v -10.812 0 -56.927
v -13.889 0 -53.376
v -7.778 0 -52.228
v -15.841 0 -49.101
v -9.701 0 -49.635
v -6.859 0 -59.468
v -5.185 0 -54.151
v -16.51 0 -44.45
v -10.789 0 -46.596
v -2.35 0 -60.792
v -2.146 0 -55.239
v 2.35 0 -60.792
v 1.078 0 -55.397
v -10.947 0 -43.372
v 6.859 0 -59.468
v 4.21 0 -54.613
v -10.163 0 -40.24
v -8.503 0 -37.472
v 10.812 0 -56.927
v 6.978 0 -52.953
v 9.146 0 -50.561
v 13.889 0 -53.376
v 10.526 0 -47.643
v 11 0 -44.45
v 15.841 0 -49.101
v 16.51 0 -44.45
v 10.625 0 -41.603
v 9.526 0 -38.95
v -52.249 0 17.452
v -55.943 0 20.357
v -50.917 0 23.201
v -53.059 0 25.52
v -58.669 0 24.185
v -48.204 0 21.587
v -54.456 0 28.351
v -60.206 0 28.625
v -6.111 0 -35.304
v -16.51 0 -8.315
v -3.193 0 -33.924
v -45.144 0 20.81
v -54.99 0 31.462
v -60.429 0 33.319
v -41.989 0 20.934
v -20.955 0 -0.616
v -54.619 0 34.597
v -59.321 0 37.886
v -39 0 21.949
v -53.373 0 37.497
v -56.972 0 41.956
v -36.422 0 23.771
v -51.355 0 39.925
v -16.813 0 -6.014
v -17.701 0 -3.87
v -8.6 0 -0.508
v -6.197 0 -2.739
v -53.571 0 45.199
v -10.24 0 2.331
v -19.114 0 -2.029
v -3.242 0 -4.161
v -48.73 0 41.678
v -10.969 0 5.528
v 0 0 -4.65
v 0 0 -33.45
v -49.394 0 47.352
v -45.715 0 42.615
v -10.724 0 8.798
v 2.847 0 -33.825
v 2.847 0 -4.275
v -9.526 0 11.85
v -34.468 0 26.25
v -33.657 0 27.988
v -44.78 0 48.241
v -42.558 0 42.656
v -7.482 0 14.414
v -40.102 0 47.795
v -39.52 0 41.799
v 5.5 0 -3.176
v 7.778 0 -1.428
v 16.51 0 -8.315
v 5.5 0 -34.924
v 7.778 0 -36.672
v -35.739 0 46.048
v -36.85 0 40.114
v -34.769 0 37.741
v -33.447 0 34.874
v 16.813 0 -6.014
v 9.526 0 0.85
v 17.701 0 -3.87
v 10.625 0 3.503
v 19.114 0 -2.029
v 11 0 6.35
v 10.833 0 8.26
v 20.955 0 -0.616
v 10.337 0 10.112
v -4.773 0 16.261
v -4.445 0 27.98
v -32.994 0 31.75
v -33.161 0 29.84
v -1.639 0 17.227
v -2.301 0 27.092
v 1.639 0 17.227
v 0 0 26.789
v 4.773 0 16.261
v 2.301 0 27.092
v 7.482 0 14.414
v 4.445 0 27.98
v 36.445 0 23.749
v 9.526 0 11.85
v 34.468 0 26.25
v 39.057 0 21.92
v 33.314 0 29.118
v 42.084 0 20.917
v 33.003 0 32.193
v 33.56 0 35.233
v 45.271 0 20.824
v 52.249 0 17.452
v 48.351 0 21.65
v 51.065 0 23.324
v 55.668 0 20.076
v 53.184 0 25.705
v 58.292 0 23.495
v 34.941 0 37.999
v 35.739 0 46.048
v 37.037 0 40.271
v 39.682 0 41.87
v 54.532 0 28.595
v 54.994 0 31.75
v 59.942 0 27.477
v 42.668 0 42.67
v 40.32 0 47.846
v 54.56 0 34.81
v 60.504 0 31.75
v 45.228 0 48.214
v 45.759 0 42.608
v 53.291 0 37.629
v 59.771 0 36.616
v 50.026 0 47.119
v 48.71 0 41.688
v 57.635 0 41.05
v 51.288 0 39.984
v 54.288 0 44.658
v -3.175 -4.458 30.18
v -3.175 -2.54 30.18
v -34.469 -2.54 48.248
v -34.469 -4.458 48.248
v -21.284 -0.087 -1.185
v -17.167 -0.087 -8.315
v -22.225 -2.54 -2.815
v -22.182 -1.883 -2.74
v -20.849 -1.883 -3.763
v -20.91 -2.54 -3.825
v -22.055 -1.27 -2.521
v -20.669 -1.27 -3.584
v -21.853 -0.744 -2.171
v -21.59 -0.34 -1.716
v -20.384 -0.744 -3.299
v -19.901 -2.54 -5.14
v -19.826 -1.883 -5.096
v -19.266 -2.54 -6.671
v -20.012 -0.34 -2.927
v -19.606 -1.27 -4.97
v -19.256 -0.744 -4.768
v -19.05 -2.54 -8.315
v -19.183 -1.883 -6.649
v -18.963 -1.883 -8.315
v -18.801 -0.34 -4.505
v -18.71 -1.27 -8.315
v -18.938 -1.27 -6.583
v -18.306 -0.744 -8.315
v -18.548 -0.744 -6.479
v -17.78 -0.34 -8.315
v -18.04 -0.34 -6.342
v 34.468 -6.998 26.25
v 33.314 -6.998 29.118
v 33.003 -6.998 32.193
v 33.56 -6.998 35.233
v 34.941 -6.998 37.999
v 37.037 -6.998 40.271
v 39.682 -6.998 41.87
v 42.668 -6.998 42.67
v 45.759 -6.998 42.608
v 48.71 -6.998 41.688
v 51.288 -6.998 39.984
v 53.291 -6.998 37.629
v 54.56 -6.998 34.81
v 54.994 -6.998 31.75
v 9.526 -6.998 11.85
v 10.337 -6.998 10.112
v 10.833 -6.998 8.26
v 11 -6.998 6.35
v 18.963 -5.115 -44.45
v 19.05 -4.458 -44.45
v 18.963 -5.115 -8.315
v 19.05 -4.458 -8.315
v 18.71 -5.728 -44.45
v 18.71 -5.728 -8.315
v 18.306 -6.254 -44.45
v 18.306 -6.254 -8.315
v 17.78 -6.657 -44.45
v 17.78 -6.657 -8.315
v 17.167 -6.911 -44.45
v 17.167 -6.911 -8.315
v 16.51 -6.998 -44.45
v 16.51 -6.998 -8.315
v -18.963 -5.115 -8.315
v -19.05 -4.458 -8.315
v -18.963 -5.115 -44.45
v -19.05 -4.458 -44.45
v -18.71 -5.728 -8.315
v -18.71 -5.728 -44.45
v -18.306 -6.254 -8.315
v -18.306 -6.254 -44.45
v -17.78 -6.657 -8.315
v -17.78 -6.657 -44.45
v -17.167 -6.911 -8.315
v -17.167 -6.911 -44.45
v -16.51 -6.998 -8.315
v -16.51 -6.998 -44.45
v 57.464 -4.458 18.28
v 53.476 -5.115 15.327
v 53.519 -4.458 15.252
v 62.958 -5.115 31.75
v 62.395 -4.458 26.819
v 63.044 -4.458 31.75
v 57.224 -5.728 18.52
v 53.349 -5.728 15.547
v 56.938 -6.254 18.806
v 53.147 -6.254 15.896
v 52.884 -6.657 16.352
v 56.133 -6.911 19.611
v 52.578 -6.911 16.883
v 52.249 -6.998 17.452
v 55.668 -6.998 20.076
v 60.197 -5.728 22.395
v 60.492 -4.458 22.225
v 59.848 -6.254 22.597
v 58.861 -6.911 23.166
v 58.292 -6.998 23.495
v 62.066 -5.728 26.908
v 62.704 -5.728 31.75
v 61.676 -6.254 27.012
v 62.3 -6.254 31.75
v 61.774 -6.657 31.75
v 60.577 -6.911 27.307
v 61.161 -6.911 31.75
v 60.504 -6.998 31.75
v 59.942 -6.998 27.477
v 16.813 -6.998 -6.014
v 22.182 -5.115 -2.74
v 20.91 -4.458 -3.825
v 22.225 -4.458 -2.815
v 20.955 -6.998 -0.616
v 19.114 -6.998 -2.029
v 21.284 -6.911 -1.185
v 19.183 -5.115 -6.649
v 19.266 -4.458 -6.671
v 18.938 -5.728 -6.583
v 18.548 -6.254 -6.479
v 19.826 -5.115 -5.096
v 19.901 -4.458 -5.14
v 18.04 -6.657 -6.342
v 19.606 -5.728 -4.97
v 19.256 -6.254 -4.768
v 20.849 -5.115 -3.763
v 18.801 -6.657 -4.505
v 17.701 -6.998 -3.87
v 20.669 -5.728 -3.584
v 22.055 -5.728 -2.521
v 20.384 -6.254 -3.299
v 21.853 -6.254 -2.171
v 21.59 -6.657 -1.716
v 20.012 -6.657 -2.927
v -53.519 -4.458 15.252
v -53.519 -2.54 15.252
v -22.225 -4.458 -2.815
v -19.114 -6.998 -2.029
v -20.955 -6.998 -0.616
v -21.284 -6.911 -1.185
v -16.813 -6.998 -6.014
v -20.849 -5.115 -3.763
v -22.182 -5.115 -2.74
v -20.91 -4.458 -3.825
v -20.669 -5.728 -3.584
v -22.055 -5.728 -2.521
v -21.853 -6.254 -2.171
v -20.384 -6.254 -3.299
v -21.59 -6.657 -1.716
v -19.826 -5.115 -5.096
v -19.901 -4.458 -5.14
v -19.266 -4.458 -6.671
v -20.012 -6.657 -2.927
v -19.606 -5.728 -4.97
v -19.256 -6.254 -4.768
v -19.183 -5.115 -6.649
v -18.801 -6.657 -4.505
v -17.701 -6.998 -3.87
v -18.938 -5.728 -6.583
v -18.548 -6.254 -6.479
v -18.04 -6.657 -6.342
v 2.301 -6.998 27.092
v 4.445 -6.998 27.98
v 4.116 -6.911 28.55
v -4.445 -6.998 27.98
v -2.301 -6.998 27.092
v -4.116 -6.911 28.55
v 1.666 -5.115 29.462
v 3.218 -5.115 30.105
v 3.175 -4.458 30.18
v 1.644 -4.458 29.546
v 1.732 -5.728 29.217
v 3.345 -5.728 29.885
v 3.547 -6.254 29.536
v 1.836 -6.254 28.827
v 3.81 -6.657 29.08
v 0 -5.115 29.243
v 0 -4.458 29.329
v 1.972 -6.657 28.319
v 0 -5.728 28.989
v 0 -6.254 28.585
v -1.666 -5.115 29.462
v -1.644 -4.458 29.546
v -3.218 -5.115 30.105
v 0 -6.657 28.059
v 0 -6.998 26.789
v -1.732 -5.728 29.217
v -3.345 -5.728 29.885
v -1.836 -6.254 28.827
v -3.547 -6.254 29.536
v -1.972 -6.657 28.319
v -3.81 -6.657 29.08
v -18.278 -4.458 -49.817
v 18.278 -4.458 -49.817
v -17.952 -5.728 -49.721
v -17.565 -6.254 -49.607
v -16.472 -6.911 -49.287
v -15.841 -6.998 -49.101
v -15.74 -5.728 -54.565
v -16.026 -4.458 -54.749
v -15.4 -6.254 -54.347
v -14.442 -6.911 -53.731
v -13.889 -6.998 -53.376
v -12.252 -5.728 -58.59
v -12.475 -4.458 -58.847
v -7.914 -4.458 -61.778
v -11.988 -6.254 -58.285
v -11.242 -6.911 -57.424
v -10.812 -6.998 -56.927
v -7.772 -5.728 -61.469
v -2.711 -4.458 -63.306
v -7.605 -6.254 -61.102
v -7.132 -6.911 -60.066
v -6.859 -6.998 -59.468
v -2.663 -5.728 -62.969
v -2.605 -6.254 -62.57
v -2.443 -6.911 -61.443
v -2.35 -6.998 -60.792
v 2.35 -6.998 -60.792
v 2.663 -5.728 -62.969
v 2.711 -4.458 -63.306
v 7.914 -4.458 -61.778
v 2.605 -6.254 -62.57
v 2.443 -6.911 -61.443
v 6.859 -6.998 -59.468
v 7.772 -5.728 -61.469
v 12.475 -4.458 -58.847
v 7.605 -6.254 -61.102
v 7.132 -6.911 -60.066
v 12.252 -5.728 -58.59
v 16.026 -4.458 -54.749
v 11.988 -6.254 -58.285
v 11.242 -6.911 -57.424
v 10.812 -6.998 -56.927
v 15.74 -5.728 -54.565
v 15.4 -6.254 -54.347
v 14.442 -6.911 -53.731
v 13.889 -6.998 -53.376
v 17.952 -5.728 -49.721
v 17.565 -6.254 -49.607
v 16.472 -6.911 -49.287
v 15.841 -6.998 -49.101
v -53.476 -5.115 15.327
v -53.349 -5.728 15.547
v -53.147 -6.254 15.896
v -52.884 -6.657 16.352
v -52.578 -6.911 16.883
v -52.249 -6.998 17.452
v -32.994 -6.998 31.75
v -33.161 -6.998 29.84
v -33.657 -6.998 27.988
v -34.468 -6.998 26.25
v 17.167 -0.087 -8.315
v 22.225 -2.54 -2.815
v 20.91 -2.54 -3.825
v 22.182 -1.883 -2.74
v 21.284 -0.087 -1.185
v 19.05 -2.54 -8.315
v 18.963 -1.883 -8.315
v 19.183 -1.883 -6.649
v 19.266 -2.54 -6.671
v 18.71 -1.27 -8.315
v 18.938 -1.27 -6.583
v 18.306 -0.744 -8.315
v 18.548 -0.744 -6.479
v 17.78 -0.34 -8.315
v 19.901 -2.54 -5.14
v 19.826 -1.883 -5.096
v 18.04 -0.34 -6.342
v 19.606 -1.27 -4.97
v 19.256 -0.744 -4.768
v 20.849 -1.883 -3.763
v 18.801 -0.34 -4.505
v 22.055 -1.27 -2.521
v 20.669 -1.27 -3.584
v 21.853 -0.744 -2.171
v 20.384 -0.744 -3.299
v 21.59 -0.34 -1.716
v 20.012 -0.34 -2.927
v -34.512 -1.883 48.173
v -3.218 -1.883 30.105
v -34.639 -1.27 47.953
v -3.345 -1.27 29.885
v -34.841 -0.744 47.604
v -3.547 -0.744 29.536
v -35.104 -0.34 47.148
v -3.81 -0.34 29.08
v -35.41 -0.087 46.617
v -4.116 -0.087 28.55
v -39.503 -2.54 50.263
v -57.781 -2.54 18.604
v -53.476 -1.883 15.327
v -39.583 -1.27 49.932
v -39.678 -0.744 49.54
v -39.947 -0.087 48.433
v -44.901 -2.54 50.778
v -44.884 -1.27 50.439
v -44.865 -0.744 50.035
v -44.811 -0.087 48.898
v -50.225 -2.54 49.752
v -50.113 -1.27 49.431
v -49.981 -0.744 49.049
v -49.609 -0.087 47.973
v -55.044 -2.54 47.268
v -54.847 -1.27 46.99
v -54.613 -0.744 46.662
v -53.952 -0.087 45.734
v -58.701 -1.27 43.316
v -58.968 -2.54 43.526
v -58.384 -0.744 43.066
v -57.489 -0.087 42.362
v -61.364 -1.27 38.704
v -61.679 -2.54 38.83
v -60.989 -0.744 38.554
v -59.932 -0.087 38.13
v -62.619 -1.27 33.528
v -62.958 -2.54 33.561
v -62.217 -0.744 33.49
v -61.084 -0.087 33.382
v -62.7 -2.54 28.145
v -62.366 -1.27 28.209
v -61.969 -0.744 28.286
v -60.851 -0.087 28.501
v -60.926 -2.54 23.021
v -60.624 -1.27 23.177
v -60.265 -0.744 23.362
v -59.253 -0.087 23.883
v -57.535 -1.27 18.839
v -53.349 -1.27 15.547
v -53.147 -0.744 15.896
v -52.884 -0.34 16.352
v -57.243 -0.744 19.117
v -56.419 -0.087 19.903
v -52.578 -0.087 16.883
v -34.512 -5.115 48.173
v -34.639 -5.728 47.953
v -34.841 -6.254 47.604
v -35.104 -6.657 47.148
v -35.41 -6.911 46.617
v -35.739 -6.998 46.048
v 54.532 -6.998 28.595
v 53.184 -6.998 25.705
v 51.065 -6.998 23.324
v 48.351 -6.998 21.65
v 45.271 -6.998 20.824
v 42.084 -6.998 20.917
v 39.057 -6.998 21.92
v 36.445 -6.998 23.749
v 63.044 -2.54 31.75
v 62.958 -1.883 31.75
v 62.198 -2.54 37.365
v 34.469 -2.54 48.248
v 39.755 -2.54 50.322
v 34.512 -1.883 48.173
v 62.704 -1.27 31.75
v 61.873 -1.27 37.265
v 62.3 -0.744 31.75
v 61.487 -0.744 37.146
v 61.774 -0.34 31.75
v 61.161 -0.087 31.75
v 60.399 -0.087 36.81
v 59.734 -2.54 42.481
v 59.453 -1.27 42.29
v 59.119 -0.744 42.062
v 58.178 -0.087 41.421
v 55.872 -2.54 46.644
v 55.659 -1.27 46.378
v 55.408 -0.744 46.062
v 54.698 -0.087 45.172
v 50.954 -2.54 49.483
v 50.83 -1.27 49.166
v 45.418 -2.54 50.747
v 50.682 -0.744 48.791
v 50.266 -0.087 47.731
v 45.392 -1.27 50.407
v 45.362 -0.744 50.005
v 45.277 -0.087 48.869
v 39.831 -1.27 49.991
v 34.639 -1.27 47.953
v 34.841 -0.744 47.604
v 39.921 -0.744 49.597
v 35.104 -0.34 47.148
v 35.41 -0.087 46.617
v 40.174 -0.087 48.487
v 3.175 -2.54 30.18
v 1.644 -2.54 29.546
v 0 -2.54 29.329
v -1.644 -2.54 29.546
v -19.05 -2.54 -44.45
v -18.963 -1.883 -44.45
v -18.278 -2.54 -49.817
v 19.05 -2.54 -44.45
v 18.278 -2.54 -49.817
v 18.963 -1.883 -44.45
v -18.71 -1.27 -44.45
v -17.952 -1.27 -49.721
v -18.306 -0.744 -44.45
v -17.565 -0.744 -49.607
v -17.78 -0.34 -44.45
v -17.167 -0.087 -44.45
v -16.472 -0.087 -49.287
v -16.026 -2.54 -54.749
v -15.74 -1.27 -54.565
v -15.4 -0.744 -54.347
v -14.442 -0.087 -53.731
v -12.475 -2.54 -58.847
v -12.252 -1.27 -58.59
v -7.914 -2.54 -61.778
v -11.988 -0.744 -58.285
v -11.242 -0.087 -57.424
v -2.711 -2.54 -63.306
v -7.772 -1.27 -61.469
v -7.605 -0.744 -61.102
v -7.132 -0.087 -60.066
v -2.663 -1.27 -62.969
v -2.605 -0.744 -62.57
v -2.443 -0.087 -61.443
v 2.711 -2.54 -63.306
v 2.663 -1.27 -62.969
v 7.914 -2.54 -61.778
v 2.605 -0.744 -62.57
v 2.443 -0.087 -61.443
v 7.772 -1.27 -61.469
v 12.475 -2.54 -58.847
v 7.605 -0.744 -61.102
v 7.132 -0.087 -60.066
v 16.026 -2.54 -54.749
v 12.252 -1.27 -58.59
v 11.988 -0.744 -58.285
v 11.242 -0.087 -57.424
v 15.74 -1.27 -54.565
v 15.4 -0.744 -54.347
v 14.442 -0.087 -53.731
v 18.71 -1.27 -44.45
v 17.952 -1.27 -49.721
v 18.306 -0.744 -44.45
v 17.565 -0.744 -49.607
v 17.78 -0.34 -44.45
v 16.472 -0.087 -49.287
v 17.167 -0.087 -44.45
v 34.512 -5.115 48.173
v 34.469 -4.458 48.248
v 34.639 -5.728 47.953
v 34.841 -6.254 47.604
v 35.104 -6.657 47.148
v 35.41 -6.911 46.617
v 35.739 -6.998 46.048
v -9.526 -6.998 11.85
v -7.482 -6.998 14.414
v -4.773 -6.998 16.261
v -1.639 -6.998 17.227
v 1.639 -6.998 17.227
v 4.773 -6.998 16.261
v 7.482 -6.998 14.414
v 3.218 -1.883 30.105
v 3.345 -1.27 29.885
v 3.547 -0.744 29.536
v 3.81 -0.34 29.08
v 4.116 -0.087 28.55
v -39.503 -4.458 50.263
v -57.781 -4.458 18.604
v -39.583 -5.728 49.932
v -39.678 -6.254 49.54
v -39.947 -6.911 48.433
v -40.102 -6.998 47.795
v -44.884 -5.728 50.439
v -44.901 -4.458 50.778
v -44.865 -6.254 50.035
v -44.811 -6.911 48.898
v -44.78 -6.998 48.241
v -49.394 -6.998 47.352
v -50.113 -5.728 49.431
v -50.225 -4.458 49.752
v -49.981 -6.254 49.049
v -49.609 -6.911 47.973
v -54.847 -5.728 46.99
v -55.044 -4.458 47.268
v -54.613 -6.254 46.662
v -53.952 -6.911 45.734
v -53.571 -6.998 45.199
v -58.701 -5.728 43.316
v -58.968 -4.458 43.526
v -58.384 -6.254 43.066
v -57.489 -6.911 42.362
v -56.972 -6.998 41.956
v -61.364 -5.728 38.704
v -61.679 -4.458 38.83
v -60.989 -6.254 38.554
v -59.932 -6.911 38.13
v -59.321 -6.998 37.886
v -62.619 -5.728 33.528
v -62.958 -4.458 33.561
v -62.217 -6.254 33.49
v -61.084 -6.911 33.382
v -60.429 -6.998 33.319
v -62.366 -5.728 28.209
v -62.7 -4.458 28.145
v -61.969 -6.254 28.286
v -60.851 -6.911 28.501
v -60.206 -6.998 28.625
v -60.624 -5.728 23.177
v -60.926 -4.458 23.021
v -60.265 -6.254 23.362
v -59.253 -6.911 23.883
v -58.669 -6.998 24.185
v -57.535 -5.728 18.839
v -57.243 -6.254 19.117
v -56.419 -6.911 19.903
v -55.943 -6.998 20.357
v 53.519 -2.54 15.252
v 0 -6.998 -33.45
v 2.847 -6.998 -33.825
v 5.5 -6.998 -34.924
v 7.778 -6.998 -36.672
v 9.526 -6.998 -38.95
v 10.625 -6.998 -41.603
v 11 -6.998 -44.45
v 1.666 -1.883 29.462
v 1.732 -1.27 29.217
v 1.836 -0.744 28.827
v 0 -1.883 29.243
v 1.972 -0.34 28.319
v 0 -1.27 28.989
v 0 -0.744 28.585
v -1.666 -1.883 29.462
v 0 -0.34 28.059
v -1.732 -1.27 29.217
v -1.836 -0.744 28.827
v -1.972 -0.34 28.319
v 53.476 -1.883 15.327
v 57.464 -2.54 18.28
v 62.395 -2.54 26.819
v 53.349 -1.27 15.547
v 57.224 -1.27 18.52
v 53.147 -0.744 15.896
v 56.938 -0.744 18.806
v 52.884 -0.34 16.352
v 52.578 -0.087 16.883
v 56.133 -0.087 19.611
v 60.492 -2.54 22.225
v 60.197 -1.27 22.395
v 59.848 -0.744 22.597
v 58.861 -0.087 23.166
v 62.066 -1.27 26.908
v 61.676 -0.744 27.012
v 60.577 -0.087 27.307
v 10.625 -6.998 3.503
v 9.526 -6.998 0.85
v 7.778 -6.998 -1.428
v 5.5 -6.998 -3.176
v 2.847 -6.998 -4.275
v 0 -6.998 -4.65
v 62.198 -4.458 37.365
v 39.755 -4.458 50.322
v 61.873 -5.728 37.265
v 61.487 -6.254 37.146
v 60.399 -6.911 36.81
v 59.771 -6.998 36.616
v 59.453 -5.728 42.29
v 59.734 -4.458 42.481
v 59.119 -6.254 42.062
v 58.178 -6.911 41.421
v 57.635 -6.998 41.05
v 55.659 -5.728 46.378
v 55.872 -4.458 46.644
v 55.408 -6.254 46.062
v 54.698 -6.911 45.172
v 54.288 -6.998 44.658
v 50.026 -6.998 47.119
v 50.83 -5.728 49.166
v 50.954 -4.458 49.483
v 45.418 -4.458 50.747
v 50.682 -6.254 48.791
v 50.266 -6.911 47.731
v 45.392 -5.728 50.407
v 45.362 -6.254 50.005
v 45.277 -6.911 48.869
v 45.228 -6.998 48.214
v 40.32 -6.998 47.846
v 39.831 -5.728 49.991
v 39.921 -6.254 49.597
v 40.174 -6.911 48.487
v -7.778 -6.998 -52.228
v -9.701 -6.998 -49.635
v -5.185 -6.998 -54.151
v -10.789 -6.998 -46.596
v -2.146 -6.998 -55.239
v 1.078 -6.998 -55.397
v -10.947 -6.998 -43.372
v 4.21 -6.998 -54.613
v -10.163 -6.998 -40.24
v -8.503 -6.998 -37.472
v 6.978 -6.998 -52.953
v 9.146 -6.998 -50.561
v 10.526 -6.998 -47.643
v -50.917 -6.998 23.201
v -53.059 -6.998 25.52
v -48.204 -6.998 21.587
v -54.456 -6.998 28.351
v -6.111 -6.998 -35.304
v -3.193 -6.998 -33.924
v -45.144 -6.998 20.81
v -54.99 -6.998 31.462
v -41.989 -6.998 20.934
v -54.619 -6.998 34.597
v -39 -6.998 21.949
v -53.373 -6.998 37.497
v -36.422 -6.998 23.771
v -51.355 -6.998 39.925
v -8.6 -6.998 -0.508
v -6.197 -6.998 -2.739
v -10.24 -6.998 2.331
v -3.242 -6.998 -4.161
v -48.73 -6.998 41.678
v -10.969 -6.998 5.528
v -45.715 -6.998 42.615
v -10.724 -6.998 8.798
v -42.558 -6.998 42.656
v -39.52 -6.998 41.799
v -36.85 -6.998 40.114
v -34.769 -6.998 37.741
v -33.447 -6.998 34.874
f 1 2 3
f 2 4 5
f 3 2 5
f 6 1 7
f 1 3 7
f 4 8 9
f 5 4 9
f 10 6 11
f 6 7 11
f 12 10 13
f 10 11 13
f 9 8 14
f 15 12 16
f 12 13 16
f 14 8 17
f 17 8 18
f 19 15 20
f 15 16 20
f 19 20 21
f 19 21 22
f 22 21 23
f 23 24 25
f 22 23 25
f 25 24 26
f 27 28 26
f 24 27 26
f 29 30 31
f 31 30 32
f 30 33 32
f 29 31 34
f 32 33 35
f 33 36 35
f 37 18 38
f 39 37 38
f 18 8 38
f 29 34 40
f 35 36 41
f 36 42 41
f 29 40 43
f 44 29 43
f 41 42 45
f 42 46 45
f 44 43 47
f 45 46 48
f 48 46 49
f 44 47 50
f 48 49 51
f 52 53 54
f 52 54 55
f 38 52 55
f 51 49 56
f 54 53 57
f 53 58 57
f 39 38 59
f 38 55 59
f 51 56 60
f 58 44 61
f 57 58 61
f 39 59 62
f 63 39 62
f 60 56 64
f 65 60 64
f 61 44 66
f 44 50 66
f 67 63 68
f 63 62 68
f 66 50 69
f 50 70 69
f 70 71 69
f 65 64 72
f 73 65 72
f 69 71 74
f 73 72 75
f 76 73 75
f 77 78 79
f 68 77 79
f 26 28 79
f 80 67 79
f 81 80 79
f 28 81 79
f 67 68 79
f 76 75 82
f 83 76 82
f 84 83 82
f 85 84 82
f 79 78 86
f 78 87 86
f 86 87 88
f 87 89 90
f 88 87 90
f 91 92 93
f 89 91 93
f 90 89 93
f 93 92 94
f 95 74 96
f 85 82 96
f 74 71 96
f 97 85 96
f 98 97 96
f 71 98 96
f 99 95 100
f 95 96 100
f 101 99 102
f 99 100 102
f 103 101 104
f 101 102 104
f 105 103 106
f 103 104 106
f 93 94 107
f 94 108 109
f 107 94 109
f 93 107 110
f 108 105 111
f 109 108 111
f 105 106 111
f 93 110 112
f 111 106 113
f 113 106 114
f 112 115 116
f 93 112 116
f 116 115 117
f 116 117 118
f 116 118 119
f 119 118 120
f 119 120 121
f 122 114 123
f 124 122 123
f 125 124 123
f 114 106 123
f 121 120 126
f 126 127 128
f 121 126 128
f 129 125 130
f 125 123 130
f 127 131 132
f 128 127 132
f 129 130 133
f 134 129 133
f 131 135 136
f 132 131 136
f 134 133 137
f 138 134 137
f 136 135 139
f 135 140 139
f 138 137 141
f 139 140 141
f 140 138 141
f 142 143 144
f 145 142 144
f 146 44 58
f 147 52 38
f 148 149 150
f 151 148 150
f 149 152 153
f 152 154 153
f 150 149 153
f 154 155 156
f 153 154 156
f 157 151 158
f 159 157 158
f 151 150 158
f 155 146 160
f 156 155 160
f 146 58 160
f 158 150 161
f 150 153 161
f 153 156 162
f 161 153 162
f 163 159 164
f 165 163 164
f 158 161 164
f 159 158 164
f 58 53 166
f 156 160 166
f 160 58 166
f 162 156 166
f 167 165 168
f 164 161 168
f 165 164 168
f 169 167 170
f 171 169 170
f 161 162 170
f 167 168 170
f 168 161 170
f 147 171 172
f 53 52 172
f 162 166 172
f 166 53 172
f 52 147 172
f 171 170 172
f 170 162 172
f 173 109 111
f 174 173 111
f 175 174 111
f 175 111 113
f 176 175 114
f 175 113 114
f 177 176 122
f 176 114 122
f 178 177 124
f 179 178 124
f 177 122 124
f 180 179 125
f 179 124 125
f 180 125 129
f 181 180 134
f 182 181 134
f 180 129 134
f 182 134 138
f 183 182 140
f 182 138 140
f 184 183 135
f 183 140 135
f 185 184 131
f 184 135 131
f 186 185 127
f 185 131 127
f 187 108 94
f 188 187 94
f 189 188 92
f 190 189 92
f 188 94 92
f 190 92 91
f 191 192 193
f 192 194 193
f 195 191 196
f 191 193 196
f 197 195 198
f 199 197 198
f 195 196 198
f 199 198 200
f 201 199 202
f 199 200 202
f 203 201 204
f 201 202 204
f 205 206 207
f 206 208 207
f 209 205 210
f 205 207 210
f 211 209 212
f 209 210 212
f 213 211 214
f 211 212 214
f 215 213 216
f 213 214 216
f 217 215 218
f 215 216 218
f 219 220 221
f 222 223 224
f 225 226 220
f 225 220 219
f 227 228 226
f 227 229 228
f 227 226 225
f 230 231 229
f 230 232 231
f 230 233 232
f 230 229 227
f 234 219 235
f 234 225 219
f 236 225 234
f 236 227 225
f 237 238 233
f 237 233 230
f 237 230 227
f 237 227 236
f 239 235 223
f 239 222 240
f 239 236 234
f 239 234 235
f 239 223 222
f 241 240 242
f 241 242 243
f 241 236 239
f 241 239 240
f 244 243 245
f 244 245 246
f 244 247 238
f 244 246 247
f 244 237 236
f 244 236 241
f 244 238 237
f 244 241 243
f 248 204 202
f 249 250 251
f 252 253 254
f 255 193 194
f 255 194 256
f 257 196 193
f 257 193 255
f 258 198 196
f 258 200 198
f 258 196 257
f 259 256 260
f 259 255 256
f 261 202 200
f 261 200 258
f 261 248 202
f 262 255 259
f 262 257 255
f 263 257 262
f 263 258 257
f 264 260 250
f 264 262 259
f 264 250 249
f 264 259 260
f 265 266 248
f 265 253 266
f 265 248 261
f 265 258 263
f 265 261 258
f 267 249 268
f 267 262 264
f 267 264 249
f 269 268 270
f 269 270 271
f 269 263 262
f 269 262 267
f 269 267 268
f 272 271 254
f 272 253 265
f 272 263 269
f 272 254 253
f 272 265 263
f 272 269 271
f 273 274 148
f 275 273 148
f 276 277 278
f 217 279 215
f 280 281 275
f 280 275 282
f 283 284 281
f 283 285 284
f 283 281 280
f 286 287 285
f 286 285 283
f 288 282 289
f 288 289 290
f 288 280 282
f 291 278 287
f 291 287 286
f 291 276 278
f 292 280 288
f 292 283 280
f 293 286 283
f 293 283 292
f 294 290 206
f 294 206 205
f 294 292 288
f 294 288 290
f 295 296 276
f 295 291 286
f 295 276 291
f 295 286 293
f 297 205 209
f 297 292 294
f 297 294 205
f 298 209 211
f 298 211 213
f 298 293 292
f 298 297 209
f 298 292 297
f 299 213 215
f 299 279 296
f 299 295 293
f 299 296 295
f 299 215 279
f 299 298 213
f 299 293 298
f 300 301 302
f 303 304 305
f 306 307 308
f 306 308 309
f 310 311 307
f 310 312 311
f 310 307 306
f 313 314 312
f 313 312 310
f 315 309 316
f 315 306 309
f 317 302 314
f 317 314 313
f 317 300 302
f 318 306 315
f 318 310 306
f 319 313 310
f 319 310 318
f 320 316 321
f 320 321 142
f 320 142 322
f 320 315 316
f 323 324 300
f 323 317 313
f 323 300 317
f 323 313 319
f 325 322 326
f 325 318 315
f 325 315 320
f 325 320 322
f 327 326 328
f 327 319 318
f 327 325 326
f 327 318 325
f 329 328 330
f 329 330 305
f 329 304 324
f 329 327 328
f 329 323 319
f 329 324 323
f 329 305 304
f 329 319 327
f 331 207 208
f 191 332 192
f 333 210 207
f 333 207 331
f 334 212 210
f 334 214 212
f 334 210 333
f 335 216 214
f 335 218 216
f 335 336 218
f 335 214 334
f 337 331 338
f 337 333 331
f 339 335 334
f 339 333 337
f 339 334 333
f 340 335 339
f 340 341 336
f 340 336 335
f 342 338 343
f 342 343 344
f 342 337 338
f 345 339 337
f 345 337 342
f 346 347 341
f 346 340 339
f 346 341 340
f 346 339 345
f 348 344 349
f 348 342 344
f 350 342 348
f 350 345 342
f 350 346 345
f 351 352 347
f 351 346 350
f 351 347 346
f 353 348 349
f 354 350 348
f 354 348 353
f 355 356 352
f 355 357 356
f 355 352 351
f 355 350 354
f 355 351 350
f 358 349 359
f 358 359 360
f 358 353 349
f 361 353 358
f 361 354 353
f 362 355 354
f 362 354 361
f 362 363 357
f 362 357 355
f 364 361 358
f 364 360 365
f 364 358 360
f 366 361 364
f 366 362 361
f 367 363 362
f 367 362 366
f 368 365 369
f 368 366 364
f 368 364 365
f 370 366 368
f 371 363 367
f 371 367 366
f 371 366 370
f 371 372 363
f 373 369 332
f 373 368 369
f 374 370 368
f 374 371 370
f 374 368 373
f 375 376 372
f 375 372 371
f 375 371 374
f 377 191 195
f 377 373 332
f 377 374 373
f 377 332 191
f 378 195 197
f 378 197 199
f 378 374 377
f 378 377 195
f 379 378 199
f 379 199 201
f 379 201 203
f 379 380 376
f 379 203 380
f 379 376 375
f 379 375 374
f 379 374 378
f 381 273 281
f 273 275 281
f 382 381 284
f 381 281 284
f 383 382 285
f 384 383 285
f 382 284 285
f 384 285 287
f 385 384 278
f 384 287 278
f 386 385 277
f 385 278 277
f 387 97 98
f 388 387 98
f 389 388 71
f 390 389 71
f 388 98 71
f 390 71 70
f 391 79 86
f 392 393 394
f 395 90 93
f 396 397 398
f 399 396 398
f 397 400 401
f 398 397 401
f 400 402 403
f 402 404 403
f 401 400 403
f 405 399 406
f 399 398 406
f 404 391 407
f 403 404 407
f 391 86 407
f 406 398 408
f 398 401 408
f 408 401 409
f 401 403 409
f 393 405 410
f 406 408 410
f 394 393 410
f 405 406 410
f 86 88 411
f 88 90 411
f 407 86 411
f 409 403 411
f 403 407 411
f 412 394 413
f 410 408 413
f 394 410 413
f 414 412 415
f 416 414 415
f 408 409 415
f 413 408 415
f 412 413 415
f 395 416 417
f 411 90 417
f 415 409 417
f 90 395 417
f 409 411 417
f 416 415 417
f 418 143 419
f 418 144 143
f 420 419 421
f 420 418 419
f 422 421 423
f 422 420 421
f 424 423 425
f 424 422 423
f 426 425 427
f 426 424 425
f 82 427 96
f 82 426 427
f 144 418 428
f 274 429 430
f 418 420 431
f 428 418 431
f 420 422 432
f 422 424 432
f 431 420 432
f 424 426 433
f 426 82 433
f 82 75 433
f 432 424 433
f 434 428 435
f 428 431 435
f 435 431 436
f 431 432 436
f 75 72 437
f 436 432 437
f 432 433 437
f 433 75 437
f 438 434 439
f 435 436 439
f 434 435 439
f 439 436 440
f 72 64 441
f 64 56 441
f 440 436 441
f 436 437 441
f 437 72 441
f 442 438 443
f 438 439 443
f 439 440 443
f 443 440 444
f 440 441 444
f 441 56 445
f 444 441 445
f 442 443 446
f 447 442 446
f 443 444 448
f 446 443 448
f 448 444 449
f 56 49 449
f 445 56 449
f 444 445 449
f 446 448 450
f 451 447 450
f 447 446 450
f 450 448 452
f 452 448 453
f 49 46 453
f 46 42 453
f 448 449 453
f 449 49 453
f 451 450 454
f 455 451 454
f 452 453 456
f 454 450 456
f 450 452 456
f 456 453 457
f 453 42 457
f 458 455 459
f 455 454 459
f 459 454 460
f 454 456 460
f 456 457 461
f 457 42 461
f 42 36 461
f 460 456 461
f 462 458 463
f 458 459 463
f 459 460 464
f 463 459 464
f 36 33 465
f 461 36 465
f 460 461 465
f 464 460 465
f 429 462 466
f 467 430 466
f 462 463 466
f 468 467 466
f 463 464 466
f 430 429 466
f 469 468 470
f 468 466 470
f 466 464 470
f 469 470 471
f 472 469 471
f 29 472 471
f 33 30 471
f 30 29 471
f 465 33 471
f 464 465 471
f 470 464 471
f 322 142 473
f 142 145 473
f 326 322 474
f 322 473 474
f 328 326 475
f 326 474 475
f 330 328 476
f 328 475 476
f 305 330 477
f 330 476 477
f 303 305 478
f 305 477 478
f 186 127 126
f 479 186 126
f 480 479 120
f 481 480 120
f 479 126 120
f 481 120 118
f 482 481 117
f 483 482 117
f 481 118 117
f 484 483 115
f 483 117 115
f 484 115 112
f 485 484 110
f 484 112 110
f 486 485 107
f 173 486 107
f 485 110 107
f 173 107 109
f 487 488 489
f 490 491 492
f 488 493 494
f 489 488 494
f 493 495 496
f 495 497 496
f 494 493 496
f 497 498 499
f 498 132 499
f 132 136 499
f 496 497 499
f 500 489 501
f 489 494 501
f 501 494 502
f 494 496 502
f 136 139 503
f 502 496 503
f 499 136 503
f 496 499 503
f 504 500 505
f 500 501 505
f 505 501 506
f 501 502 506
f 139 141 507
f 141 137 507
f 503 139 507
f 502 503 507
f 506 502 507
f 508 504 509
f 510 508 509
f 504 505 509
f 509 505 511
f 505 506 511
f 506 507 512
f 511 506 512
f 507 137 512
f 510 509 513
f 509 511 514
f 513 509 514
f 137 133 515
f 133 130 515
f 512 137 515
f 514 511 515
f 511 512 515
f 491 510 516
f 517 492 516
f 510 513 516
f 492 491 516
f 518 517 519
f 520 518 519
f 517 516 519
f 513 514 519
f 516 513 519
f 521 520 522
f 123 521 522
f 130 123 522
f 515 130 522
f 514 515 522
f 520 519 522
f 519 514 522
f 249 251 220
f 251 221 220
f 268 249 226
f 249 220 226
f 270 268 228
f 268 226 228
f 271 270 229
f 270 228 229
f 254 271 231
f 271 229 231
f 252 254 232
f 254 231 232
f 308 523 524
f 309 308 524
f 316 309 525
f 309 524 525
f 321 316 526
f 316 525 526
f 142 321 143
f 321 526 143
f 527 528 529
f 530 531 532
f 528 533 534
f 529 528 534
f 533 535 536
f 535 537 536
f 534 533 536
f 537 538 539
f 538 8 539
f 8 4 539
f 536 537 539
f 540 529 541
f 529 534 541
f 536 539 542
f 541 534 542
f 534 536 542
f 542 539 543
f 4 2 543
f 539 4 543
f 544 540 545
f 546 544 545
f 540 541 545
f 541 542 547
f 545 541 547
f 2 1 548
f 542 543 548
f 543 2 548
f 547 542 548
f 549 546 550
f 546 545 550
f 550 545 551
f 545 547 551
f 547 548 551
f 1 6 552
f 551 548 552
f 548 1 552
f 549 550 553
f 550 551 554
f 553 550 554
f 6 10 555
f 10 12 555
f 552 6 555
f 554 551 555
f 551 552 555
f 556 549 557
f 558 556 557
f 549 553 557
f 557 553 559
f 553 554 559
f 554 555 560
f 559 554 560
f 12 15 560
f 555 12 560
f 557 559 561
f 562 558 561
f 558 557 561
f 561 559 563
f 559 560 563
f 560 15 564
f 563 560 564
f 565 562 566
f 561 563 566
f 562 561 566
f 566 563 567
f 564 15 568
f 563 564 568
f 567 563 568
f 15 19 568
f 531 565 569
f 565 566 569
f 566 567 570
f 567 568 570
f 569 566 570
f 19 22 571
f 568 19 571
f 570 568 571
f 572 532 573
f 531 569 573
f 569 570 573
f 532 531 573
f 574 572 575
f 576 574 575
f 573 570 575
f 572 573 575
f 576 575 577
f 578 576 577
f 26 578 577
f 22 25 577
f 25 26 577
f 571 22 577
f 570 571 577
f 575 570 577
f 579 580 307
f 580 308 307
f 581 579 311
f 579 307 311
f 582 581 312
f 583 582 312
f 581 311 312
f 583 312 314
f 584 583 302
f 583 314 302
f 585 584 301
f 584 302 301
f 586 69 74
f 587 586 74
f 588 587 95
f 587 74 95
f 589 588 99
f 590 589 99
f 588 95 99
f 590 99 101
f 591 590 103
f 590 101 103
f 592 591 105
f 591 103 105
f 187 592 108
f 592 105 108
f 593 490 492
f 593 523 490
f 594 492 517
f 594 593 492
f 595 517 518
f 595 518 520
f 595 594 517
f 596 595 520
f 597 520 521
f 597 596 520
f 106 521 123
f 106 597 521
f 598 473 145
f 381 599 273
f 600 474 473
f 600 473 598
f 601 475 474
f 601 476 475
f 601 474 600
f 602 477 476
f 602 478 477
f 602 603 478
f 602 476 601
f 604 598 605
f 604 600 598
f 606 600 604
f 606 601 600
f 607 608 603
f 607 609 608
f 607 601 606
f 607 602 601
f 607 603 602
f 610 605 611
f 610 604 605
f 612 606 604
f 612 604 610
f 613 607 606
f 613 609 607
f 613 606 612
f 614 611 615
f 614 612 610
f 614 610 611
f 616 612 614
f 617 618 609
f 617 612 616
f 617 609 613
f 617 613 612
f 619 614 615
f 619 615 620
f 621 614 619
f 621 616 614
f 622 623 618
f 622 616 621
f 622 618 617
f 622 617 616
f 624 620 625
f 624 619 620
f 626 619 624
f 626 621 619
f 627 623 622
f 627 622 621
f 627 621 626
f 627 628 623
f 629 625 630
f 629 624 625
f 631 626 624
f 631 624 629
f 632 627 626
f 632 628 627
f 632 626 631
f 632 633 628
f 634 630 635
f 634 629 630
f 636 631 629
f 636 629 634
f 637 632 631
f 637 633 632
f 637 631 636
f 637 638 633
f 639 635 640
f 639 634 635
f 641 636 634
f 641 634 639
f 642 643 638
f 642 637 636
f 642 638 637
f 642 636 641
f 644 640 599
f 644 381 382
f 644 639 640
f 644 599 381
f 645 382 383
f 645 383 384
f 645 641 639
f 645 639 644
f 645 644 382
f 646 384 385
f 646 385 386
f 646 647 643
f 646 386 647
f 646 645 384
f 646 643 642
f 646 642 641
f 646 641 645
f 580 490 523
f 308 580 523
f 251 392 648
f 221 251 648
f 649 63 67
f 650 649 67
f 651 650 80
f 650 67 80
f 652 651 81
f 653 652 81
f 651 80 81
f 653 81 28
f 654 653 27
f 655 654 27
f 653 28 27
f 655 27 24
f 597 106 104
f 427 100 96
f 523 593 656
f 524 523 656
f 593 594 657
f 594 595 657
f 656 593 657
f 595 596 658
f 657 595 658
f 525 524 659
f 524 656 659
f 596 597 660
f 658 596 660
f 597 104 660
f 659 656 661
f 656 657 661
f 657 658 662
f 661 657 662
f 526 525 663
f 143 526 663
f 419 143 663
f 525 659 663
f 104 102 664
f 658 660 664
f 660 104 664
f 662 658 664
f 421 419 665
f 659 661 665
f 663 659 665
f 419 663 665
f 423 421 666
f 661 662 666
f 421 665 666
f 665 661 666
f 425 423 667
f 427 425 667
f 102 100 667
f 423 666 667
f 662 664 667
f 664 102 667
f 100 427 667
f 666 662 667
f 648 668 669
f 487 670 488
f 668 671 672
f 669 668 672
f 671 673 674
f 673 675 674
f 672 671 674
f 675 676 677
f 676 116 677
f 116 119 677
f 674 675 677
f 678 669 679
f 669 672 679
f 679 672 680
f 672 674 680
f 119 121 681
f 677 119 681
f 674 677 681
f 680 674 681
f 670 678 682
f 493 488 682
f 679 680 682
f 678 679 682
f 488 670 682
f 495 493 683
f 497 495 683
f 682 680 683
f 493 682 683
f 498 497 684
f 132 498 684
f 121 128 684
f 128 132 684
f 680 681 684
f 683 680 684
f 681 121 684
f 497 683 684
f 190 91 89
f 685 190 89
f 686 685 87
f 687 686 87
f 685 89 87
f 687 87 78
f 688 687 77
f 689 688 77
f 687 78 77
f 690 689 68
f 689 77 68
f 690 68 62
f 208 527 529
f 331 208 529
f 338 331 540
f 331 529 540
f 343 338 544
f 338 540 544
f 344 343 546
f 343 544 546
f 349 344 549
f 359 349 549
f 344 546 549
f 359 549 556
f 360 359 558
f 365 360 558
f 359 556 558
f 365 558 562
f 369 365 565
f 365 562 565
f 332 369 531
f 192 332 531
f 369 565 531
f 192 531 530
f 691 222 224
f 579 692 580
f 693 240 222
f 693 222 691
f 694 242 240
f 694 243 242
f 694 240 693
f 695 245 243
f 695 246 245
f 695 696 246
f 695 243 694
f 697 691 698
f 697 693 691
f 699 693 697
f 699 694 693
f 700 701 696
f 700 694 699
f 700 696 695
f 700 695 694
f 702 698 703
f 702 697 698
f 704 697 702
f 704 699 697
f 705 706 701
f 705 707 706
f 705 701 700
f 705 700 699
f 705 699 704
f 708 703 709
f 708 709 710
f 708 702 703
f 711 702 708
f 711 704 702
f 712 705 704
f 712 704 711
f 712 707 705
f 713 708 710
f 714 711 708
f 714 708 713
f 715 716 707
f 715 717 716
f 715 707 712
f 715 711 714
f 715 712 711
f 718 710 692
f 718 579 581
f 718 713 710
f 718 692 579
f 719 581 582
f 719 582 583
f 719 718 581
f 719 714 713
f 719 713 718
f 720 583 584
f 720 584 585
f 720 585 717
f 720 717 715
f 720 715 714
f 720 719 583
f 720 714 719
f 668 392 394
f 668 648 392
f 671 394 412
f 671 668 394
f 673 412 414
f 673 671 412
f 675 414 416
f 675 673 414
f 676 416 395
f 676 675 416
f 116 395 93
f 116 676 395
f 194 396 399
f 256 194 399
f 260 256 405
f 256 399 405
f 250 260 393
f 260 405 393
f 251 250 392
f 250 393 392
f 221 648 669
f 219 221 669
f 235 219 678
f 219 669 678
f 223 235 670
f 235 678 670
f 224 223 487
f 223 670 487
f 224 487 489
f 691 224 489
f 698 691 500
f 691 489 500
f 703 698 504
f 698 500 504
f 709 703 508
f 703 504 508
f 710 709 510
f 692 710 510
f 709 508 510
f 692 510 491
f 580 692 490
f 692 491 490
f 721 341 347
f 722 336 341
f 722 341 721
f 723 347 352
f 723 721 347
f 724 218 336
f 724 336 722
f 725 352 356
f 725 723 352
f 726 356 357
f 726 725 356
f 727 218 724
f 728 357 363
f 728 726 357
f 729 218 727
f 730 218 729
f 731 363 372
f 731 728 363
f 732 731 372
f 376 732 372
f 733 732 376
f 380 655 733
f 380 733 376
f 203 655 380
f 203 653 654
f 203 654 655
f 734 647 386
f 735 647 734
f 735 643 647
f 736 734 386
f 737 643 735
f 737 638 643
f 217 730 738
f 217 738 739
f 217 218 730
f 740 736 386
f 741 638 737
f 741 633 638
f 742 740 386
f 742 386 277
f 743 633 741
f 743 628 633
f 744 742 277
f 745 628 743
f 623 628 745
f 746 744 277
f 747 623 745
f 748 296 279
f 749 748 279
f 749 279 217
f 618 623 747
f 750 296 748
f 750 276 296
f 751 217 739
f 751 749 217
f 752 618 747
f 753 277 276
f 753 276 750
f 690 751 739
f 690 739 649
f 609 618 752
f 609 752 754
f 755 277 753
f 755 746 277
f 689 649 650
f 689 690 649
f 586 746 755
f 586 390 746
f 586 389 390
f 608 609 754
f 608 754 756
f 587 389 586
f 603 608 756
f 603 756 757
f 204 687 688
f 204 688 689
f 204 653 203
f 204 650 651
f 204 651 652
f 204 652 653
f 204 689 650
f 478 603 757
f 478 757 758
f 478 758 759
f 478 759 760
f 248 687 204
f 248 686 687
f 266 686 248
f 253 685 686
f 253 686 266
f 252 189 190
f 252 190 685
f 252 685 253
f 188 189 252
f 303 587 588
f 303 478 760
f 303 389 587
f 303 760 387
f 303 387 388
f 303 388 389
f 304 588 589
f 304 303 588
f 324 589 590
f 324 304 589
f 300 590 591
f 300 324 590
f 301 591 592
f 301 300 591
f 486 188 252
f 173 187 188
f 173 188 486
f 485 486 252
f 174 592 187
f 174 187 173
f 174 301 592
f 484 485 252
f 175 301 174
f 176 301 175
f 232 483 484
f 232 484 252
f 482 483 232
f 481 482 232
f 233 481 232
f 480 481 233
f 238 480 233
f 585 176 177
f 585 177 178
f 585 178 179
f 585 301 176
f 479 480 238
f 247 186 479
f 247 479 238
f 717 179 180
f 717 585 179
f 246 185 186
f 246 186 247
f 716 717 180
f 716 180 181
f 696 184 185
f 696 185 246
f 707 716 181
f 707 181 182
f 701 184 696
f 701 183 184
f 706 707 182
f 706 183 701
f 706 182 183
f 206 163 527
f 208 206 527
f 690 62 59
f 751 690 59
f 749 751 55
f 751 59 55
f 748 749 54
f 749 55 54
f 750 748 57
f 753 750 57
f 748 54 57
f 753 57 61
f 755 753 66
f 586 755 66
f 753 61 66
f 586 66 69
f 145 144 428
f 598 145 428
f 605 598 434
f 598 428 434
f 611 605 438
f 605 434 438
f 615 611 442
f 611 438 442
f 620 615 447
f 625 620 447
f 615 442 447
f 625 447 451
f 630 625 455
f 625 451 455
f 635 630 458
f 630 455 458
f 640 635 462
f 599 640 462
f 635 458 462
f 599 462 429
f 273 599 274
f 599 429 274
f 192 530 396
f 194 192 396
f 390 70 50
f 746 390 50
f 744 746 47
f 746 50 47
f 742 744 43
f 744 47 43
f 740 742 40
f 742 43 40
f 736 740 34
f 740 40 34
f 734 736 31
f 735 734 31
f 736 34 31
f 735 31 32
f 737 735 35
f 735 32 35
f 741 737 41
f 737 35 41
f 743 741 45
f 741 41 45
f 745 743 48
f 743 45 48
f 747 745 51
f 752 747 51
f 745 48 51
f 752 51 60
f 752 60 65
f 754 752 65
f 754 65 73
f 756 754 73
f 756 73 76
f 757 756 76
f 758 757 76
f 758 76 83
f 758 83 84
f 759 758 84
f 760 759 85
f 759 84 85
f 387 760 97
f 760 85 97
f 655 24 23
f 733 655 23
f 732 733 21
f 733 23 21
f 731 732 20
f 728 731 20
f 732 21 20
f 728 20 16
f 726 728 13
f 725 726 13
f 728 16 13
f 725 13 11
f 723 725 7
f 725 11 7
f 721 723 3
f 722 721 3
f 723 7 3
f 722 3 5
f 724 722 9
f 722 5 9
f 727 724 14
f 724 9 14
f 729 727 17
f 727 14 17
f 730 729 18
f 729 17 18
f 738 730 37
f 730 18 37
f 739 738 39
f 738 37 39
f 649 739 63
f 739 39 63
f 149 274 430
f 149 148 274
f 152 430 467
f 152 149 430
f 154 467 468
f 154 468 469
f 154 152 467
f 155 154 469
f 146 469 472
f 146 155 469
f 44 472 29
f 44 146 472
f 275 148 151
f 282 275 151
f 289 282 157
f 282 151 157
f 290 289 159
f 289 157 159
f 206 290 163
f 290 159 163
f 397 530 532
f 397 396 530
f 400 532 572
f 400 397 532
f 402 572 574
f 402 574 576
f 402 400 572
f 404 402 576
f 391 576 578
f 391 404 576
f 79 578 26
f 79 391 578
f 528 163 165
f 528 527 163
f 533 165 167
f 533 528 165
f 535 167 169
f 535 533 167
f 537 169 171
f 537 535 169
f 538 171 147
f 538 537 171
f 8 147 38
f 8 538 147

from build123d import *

# Parameters (mm, degrees)
F1_DEPTH = 6.9977
F2_R     = 2.54


with BuildPart() as f1:
    # F0 (on Front) → F1 (new body)
    with BuildSketch(Plane.XZ):
        with BuildLine():
            ThreePointArc((16.4977839421, 15.875), (18.4008869908, 11.2805028092), (19.05, 6.35))
            ThreePointArc((19.05, 6.35), (13.4703841816, -7.1203841816), (0, -12.7))
            Line((0, -12.7), (0, -25.4))
            ThreePointArc((0, -25.4), (13.4703841816, -30.9796158184), (19.05, -44.45))
            Line((19.05, -44.45), (19.05, -8.3146968374))
            ThreePointArc((19.05, -8.3146968374), (19.900738686, -5.1396968374), (22.225, -2.8154355234))
            Line((22.225, -2.8154355234), (53.5190905122, 15.2522160579))
            ThreePointArc((53.5190905122, 15.2522160579), (39.063587703, 13.3491130092), (27.4963065702, 22.225))
            Line((27.4963065702, 22.225), (16.4977839421, 15.875))
        make_face()
        with BuildLine():
            ThreePointArc((-16.4977839421, 15.875), (0, 25.4), (16.4977839421, 15.875))
            Line((16.4977839421, 15.875), (27.4963065702, 22.225))
            ThreePointArc((27.4963065702, 22.225), (25.5932035214, 36.6805028092), (34.4690905122, 48.2477839421))
            Line((34.4690905122, 48.2477839421), (3.175, 30.1801323608))
            ThreePointArc((3.175, 30.1801323608), (0, 29.3293936748), (-3.175, 30.1801323608))
            Line((-3.175, 30.1801323608), (-34.4690905122, 48.2477839421))
            ThreePointArc((-34.4690905122, 48.2477839421), (-27.4963065702, 41.275), (-24.9440905122, 31.75))
            ThreePointArc((-24.9440905122, 31.75), (-25.5932035214, 26.8194971908), (-27.4963065702, 22.225))
            Line((-27.4963065702, 22.225), (-16.4977839421, 15.875))
        make_face()
        with BuildLine():
            Line((0, -25.4), (0, -12.7))
            ThreePointArc((0, -12.7), (-16.4977839421, -3.175), (-16.4977839421, 15.875))
            Line((-16.4977839421, 15.875), (-27.4963065702, 22.225))
            ThreePointArc((-27.4963065702, 22.225), (-39.063587703, 13.3491130092), (-53.5190905122, 15.2522160579))
            Line((-53.5190905122, 15.2522160579), (-22.225, -2.8154355234))
            ThreePointArc((-22.225, -2.8154355234), (-19.900738686, -5.1396968374), (-19.05, -8.3146968374))
            Line((-19.05, -8.3146968374), (-19.05, -44.45))
            ThreePointArc((-19.05, -44.45), (-13.4703841816, -30.9796158184), (0, -25.4))
        make_face()
        with BuildLine():
            ThreePointArc((34.4690905122, 48.2477839421), (25.5932035214, 36.6805028092), (27.4963065702, 22.225))
            ThreePointArc((27.4963065702, 22.225), (39.063587703, 13.3491130092), (53.5190905122, 15.2522160579))
            ThreePointArc((53.5190905122, 15.2522160579), (60.4918744543, 22.225), (63.0440905122, 31.75))
            ThreePointArc((63.0440905122, 31.75), (53.5190905122, 48.2477839421), (34.4690905122, 48.2477839421))
        make_face()
        with BuildLine():
            ThreePointArc((54.9940939122, 31.75), (46.8411008884, 21.1248126267), (34.4678081261, 26.2499983))
            ThreePointArc((34.4678081261, 26.2499983), (41.1470801361, 42.3751873733), (54.9940939122, 31.75))
        make_face(mode=Mode.SUBTRACT)
        with BuildLine():
            ThreePointArc((19.05, -44.45), (13.4703841816, -30.9796158184), (0, -25.4))
            ThreePointArc((0, -25.4), (-13.4703841816, -30.9796158184), (-19.05, -44.45))
            ThreePointArc((-19.05, -44.45), (0, -63.5), (19.05, -44.45))
        make_face()
        with BuildLine():
            ThreePointArc((11.0000034, -44.45), (-7.7781769972, -52.2281769972), (0, -33.4499966))
            ThreePointArc((0, -33.4499966), (7.7781769972, -36.6718230028), (11.0000034, -44.45))
        make_face(mode=Mode.SUBTRACT)
        with BuildLine():
            ThreePointArc((-53.5190905122, 15.2522160579), (-39.063587703, 13.3491130092), (-27.4963065702, 22.225))
            ThreePointArc((-27.4963065702, 22.225), (-25.5932035214, 26.8194971908), (-24.9440905122, 31.75))
            ThreePointArc((-24.9440905122, 31.75), (-27.4963065702, 41.275), (-34.4690905122, 48.2477839421))
            ThreePointArc((-34.4690905122, 48.2477839421), (-60.4918744543, 41.275), (-53.5190905122, 15.2522160579))
        make_face()
        with BuildLine():
            ThreePointArc((-32.9940871122, 31.75), (-33.3689031389, 28.9029896239), (-34.4678081261, 26.2499983))
            ThreePointArc((-34.4678081261, 26.2499983), (-54.6192778856, 34.5970103761), (-32.9940871122, 31.75))
        make_face(mode=Mode.SUBTRACT)
        with BuildLine():
            ThreePointArc((-16.4977839421, 15.875), (-16.4977839421, -3.175), (0, -12.7))
            Line((0, -12.7), (0, -4.6500034))
            ThreePointArc((0, -4.6500034), (-9.5262823861, 0.8499983), (-9.5262823861, 11.8500017))
            Line((-9.5262823861, 11.8500017), (-16.4977839421, 15.875))
        make_face()
        with BuildLine():
            ThreePointArc((0, -12.7), (13.4703841816, -7.1203841816), (19.05, 6.35))
            ThreePointArc((19.05, 6.35), (18.4008869908, 11.2805028092), (16.4977839421, 15.875))
            Line((16.4977839421, 15.875), (9.5262823861, 11.8500017))
            ThreePointArc((9.5262823861, 11.8500017), (10.6251873733, 9.1970103761), (11.0000034, 6.35))
            ThreePointArc((11.0000034, 6.35), (7.7781769972, -1.4281769972), (0, -4.6500034))
            Line((0, -4.6500034), (0, -12.7))
        make_face()
        with BuildLine():
            Line((9.5262823861, 11.8500017), (16.4977839421, 15.875))
            ThreePointArc((16.4977839421, 15.875), (0, 25.4), (-16.4977839421, 15.875))
            Line((-16.4977839421, 15.875), (-9.5262823861, 11.8500017))
            ThreePointArc((-9.5262823861, 11.8500017), (0, 17.3500034), (9.5262823861, 11.8500017))
        make_face()
    extrude(amount=F1_DEPTH)

    # F2
    f2_edges = [f1.edges().sort_by_distance(p)[0] for p in [
        (0, -6.9977, -63.5),
        (0, 0, -63.5),
    ]]
    fillet(f2_edges, radius=F2_R)


solid = f1.part
